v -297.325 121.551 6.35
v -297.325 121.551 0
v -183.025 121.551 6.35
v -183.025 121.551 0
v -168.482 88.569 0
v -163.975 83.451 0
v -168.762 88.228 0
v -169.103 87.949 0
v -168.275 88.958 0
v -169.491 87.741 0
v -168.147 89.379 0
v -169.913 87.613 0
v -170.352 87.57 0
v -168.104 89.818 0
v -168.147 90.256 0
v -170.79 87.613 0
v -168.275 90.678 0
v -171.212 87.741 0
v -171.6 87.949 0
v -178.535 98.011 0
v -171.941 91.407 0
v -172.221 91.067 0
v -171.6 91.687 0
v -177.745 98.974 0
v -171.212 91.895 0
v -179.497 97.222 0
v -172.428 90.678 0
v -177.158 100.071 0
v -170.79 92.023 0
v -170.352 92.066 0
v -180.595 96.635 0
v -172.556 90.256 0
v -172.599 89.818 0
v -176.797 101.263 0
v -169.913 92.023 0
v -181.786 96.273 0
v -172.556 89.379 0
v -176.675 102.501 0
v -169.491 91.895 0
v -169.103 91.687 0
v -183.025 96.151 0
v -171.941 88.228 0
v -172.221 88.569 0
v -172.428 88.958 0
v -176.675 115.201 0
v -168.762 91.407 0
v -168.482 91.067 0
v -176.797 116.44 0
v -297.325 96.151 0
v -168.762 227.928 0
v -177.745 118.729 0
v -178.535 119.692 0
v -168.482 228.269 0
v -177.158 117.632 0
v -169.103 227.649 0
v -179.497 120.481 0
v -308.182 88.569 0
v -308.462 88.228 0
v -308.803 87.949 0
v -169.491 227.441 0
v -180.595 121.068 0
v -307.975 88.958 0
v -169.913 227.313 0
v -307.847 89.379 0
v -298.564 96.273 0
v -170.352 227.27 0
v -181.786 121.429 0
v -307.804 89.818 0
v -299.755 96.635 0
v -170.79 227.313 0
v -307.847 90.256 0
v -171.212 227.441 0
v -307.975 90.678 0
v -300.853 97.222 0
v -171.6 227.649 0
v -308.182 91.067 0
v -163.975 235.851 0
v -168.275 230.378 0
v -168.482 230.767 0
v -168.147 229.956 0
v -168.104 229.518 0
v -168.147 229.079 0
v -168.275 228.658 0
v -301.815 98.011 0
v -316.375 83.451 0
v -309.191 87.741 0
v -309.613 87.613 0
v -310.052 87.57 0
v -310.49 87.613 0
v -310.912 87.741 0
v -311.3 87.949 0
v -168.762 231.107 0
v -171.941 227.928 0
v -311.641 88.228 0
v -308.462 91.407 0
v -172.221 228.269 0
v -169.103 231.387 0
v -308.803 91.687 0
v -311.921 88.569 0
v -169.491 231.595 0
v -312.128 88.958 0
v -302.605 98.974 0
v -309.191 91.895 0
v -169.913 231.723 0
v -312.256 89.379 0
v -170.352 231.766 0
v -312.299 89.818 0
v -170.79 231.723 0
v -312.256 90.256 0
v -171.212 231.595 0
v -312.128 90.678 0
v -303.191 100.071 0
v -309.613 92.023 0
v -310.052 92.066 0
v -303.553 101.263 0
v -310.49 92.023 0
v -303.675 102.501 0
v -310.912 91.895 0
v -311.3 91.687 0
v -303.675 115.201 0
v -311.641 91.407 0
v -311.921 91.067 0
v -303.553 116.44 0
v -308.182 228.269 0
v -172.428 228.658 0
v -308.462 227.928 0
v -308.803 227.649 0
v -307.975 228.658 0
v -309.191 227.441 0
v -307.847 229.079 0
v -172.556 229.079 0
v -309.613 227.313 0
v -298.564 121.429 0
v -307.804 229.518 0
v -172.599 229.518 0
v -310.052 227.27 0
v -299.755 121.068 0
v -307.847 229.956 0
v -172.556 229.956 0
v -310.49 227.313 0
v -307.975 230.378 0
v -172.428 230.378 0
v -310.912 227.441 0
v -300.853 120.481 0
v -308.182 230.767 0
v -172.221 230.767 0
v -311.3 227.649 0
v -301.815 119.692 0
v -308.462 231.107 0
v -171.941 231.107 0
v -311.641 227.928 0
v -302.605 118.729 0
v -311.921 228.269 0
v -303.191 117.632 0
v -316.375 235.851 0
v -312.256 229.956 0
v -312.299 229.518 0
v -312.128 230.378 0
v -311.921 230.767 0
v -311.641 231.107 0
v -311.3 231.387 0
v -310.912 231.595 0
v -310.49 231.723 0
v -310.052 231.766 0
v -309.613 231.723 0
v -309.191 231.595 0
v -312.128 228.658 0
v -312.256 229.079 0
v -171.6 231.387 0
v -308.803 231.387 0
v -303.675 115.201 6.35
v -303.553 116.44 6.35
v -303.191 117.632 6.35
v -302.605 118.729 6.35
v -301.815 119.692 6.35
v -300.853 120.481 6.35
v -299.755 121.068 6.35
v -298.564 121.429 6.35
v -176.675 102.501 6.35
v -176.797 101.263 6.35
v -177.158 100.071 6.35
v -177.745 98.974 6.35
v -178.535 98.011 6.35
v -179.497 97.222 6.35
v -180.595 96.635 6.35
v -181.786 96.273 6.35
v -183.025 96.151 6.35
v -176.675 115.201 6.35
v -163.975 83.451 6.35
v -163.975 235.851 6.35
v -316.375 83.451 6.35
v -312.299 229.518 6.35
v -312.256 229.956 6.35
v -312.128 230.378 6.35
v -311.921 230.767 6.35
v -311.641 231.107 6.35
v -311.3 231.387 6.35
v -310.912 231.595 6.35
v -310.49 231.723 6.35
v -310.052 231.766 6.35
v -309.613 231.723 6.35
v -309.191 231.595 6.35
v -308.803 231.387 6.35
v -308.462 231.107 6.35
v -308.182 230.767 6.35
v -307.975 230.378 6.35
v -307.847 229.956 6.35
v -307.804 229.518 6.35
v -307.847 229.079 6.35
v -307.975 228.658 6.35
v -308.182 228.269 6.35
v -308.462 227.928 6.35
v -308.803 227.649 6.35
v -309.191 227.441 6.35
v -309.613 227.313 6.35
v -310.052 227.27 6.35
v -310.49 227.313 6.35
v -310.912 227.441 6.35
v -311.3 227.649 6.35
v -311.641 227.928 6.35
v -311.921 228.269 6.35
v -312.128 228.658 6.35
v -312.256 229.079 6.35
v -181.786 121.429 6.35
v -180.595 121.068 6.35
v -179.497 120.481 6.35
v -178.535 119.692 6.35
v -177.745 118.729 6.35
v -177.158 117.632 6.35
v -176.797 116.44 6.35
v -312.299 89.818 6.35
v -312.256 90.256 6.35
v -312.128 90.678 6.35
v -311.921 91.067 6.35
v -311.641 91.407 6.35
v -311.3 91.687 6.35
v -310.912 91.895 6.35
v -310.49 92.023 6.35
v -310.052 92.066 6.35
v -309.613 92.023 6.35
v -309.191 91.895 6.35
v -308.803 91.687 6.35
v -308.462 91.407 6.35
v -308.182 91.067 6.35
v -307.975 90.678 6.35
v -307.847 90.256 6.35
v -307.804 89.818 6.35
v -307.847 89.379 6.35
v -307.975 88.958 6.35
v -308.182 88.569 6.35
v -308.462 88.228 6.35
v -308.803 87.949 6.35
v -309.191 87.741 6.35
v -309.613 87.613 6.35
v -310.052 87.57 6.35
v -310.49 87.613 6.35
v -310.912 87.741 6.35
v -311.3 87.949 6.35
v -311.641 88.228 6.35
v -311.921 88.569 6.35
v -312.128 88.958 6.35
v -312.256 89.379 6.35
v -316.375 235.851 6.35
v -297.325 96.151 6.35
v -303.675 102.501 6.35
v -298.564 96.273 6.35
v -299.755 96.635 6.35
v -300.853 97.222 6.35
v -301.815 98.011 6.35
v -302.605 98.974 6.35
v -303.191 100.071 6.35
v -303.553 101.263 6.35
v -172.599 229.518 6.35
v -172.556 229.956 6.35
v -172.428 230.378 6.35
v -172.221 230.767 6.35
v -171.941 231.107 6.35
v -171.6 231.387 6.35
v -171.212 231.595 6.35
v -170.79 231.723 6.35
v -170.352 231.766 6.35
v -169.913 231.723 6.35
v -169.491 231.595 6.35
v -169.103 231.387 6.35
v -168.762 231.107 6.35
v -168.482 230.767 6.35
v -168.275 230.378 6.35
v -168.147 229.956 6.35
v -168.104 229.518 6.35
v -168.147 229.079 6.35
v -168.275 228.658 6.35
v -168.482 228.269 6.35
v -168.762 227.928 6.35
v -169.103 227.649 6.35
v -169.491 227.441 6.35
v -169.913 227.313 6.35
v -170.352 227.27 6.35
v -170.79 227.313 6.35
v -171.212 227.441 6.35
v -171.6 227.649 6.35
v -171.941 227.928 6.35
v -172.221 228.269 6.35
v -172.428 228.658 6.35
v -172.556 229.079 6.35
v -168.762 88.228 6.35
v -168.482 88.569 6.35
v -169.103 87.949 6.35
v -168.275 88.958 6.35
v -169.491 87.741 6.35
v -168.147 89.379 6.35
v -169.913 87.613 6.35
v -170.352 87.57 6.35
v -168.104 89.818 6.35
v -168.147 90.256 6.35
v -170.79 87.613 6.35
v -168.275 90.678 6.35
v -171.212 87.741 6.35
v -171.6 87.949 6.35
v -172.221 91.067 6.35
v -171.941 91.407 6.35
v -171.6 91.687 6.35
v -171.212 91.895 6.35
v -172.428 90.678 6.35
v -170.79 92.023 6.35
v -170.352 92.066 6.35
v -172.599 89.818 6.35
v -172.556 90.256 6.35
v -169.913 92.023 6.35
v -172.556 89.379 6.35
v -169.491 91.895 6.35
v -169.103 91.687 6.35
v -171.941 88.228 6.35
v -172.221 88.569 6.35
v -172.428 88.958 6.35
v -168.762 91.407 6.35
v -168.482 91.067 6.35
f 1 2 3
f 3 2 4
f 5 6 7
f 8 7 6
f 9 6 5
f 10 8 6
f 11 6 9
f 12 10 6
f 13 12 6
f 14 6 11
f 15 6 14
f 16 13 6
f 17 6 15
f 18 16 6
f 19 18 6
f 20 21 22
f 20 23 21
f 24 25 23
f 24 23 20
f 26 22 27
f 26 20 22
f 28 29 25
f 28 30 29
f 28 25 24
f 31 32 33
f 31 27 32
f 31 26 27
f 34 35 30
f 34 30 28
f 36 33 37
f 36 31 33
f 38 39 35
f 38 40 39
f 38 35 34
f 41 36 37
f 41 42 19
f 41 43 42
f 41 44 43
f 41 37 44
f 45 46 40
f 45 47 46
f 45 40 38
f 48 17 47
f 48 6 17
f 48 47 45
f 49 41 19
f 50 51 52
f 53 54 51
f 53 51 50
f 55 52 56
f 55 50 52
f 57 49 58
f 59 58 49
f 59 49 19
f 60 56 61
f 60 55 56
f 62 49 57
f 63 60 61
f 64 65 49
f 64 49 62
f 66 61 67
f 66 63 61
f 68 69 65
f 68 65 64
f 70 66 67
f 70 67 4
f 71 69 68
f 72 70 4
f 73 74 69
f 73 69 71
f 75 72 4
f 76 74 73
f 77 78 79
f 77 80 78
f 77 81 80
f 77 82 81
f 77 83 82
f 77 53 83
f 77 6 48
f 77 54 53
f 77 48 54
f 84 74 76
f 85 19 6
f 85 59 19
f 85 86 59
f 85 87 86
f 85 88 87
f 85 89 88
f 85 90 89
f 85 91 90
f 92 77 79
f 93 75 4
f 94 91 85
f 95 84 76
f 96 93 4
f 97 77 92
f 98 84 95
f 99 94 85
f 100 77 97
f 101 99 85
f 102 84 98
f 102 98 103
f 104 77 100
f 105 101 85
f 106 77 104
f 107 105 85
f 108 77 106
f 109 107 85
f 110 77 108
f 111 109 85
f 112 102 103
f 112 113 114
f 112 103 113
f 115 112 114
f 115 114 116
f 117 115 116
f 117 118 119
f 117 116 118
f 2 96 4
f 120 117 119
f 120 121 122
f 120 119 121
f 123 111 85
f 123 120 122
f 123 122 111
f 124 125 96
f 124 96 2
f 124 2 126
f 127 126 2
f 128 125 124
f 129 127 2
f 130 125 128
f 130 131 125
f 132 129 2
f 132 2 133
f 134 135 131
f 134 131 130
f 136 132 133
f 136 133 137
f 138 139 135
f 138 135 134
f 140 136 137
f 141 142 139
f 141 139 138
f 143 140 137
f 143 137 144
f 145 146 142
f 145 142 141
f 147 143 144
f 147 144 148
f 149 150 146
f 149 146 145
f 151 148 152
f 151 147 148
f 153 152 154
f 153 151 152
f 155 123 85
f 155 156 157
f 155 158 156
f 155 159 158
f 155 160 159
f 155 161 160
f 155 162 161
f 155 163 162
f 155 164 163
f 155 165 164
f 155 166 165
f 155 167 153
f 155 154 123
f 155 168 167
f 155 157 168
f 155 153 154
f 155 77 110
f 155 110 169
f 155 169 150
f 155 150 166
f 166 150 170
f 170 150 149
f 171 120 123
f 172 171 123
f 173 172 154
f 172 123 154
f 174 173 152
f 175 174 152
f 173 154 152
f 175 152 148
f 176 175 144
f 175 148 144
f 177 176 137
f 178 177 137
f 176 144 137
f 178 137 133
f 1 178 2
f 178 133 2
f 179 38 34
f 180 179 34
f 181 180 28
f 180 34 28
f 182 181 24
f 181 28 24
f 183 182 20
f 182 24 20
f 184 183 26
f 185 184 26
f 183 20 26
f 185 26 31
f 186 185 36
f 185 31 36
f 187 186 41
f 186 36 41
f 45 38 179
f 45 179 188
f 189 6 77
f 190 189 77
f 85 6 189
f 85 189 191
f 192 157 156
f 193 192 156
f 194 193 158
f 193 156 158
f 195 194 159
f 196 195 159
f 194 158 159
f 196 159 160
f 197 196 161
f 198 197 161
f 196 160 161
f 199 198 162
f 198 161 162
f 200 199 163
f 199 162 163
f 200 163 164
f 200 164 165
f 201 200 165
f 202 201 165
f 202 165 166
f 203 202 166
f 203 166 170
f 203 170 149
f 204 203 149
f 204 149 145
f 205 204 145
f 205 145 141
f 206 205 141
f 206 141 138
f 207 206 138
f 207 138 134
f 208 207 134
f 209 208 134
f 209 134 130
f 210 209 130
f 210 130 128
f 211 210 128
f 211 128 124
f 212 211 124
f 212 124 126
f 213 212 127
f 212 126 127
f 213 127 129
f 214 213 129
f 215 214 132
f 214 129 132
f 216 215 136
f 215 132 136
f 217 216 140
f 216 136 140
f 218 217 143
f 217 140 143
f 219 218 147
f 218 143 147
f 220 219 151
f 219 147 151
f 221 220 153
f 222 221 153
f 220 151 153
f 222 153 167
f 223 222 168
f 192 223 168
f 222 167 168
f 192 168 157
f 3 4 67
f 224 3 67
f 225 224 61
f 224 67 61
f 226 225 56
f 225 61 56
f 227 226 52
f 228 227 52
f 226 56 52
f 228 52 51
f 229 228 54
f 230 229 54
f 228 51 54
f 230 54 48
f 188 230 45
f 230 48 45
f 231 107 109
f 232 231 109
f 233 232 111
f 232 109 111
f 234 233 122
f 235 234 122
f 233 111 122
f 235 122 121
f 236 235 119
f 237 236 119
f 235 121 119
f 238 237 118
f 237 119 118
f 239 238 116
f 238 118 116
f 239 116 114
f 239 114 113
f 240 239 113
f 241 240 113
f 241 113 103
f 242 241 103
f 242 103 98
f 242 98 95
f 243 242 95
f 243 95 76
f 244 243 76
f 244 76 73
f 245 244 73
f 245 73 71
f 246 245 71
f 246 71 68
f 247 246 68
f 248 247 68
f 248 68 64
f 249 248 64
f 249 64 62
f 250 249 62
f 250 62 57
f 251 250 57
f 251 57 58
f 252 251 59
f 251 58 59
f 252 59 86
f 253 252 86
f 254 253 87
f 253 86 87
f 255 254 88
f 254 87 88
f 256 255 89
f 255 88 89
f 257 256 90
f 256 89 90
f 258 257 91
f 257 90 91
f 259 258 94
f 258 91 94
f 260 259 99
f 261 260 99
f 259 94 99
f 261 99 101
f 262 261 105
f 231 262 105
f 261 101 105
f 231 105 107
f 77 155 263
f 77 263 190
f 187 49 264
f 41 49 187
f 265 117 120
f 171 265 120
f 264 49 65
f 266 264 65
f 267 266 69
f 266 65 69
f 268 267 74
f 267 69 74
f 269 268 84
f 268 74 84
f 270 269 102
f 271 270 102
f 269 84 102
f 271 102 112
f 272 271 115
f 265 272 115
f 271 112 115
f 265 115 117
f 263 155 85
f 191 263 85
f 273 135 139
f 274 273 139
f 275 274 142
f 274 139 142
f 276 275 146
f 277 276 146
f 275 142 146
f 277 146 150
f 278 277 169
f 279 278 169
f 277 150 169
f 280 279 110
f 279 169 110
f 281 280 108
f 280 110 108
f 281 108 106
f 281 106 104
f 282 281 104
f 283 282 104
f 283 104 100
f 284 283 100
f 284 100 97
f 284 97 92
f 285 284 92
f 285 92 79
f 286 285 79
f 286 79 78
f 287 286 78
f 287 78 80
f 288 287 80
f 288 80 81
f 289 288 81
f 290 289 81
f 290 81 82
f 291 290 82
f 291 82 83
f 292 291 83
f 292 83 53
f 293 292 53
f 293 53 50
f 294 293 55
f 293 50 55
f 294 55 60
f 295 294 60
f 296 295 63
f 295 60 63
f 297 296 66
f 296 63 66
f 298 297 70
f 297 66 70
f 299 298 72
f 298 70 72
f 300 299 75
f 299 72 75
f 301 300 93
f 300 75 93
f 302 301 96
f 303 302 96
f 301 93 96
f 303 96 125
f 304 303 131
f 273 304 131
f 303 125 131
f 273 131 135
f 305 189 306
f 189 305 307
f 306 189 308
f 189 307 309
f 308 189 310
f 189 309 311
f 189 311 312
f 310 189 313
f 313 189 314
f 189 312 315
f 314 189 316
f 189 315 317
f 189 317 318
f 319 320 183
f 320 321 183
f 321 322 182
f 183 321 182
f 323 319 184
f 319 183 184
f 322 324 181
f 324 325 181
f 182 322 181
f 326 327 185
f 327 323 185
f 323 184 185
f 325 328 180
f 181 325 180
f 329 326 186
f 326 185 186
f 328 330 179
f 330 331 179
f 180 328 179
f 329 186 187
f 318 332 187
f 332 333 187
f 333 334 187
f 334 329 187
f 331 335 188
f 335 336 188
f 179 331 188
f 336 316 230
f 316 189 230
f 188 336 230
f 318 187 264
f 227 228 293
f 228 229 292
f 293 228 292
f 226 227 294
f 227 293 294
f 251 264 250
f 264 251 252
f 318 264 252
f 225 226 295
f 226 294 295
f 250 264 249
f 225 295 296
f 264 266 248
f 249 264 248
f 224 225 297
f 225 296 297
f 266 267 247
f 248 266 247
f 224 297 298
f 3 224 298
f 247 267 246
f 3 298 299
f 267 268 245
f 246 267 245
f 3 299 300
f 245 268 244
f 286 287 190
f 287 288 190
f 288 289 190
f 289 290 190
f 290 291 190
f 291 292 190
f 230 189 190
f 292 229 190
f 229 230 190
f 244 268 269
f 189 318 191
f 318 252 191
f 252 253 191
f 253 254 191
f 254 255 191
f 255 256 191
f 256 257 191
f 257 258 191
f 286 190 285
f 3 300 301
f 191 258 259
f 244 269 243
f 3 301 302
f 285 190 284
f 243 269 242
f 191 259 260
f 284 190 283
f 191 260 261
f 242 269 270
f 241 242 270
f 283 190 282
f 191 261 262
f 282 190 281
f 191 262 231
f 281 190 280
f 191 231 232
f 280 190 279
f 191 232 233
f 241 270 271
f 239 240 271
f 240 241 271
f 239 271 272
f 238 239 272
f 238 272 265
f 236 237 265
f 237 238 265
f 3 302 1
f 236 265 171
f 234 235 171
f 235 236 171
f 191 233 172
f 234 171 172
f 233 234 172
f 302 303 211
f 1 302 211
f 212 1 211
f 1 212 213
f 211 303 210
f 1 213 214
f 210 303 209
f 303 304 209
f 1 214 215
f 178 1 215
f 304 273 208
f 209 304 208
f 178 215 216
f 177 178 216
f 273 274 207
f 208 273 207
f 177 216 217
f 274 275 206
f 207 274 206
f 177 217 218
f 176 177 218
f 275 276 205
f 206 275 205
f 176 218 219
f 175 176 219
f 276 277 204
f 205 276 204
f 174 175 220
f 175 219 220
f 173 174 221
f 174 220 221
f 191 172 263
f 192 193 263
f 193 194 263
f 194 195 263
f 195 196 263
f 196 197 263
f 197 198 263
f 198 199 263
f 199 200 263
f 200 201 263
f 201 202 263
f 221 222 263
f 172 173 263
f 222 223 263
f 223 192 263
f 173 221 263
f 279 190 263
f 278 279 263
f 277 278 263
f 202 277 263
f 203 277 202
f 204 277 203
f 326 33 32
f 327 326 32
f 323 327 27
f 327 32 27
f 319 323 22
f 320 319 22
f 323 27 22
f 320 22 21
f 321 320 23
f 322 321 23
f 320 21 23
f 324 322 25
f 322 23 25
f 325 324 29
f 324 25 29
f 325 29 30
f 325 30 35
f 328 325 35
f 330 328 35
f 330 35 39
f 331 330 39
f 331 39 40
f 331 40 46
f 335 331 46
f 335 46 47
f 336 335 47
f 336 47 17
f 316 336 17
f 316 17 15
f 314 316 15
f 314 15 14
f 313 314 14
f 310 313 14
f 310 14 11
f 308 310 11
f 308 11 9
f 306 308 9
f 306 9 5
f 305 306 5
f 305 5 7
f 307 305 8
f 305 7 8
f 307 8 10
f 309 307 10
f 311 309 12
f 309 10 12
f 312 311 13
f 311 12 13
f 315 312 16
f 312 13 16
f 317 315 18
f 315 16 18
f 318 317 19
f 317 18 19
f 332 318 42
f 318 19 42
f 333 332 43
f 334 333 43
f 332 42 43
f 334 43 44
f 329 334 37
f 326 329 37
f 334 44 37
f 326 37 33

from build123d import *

# Parameters (mm, degrees)
SKETCH1_W             = 127
SKETCH1_H             = 25.4
BOSS_EXTRUDE1_DEPTH   = 6.35
F_8_CLEARANCE_HOLE2_D = 4.4958
LPATTERN1_COUNT       = 2
LPATTERN1_PITCH       = 139.7
LPATTERN1_COUNT_DIR2  = 2
LPATTERN1_PITCH_DIR2  = 139.7


with BuildPart() as part:
    # Sketch1 → Boss-Extrude1 (new body)
    with BuildSketch(Plane.XY):
        Polygon((-163.974683544, 121.551475626), (-163.974683544, 83.451475626), (-316.374683544, 83.451475626), (-316.374683544, 121.551475626), (-316.374683544, 235.851475626), (-163.974683544, 235.851475626), align=None)
        with Locations((-240.174683544, 108.851475626)):
            Rectangle(SKETCH1_W, SKETCH1_H, mode=Mode.SUBTRACT)
        with BuildLine():
            Line((-303.674683544, 121.551475626), (-303.674683544, 115.201475626))
            ThreePointArc((-303.674683544, 115.201475626), (-301.814811605, 119.691603686), (-297.324683544, 121.551475626))
            Line((-297.324683544, 121.551475626), (-303.674683544, 121.551475626))
        make_face()
        with BuildLine():
            Line((-303.674683544, 102.501475626), (-303.674683544, 96.151475626))
            Line((-303.674683544, 96.151475626), (-297.324683544, 96.151475626))
            ThreePointArc((-297.324683544, 96.151475626), (-301.814811605, 98.011347565), (-303.674683544, 102.501475626))
        make_face()
        with BuildLine():
            ThreePointArc((-183.024683544, 121.551475626), (-178.534555484, 119.691603686), (-176.674683544, 115.201475626))
            Line((-176.674683544, 115.201475626), (-176.674683544, 121.551475626))
            Line((-176.674683544, 121.551475626), (-183.024683544, 121.551475626))
        make_face()
        with BuildLine():
            ThreePointArc((-176.674683544, 102.501475626), (-178.534555484, 98.011347565), (-183.024683544, 96.151475626))
            Line((-183.024683544, 96.151475626), (-176.674683544, 96.151475626))
            Line((-176.674683544, 96.151475626), (-176.674683544, 102.501475626))
        make_face()
    extrude(amount=BOSS_EXTRUDE1_DEPTH)

    # #8 Clearance Hole2 (through all)
    with Locations(Plane.XY.offset(6.35)):
        with Locations((-310.051516204, 229.517938536)):
            f_8_clearance_hole2 = Hole(F_8_CLEARANCE_HOLE2_D / 2)

    # LPattern1: 8 Clearance Hole2 2 × 2
    with Locations(*[(j * LPATTERN1_PITCH_DIR2, -i * LPATTERN1_PITCH, 0) for i in range(LPATTERN1_COUNT) for j in range(LPATTERN1_COUNT_DIR2) if (i, j) != (0, 0)]):
        add(f_8_clearance_hole2, mode=Mode.SUBTRACT)


solid = part.part
